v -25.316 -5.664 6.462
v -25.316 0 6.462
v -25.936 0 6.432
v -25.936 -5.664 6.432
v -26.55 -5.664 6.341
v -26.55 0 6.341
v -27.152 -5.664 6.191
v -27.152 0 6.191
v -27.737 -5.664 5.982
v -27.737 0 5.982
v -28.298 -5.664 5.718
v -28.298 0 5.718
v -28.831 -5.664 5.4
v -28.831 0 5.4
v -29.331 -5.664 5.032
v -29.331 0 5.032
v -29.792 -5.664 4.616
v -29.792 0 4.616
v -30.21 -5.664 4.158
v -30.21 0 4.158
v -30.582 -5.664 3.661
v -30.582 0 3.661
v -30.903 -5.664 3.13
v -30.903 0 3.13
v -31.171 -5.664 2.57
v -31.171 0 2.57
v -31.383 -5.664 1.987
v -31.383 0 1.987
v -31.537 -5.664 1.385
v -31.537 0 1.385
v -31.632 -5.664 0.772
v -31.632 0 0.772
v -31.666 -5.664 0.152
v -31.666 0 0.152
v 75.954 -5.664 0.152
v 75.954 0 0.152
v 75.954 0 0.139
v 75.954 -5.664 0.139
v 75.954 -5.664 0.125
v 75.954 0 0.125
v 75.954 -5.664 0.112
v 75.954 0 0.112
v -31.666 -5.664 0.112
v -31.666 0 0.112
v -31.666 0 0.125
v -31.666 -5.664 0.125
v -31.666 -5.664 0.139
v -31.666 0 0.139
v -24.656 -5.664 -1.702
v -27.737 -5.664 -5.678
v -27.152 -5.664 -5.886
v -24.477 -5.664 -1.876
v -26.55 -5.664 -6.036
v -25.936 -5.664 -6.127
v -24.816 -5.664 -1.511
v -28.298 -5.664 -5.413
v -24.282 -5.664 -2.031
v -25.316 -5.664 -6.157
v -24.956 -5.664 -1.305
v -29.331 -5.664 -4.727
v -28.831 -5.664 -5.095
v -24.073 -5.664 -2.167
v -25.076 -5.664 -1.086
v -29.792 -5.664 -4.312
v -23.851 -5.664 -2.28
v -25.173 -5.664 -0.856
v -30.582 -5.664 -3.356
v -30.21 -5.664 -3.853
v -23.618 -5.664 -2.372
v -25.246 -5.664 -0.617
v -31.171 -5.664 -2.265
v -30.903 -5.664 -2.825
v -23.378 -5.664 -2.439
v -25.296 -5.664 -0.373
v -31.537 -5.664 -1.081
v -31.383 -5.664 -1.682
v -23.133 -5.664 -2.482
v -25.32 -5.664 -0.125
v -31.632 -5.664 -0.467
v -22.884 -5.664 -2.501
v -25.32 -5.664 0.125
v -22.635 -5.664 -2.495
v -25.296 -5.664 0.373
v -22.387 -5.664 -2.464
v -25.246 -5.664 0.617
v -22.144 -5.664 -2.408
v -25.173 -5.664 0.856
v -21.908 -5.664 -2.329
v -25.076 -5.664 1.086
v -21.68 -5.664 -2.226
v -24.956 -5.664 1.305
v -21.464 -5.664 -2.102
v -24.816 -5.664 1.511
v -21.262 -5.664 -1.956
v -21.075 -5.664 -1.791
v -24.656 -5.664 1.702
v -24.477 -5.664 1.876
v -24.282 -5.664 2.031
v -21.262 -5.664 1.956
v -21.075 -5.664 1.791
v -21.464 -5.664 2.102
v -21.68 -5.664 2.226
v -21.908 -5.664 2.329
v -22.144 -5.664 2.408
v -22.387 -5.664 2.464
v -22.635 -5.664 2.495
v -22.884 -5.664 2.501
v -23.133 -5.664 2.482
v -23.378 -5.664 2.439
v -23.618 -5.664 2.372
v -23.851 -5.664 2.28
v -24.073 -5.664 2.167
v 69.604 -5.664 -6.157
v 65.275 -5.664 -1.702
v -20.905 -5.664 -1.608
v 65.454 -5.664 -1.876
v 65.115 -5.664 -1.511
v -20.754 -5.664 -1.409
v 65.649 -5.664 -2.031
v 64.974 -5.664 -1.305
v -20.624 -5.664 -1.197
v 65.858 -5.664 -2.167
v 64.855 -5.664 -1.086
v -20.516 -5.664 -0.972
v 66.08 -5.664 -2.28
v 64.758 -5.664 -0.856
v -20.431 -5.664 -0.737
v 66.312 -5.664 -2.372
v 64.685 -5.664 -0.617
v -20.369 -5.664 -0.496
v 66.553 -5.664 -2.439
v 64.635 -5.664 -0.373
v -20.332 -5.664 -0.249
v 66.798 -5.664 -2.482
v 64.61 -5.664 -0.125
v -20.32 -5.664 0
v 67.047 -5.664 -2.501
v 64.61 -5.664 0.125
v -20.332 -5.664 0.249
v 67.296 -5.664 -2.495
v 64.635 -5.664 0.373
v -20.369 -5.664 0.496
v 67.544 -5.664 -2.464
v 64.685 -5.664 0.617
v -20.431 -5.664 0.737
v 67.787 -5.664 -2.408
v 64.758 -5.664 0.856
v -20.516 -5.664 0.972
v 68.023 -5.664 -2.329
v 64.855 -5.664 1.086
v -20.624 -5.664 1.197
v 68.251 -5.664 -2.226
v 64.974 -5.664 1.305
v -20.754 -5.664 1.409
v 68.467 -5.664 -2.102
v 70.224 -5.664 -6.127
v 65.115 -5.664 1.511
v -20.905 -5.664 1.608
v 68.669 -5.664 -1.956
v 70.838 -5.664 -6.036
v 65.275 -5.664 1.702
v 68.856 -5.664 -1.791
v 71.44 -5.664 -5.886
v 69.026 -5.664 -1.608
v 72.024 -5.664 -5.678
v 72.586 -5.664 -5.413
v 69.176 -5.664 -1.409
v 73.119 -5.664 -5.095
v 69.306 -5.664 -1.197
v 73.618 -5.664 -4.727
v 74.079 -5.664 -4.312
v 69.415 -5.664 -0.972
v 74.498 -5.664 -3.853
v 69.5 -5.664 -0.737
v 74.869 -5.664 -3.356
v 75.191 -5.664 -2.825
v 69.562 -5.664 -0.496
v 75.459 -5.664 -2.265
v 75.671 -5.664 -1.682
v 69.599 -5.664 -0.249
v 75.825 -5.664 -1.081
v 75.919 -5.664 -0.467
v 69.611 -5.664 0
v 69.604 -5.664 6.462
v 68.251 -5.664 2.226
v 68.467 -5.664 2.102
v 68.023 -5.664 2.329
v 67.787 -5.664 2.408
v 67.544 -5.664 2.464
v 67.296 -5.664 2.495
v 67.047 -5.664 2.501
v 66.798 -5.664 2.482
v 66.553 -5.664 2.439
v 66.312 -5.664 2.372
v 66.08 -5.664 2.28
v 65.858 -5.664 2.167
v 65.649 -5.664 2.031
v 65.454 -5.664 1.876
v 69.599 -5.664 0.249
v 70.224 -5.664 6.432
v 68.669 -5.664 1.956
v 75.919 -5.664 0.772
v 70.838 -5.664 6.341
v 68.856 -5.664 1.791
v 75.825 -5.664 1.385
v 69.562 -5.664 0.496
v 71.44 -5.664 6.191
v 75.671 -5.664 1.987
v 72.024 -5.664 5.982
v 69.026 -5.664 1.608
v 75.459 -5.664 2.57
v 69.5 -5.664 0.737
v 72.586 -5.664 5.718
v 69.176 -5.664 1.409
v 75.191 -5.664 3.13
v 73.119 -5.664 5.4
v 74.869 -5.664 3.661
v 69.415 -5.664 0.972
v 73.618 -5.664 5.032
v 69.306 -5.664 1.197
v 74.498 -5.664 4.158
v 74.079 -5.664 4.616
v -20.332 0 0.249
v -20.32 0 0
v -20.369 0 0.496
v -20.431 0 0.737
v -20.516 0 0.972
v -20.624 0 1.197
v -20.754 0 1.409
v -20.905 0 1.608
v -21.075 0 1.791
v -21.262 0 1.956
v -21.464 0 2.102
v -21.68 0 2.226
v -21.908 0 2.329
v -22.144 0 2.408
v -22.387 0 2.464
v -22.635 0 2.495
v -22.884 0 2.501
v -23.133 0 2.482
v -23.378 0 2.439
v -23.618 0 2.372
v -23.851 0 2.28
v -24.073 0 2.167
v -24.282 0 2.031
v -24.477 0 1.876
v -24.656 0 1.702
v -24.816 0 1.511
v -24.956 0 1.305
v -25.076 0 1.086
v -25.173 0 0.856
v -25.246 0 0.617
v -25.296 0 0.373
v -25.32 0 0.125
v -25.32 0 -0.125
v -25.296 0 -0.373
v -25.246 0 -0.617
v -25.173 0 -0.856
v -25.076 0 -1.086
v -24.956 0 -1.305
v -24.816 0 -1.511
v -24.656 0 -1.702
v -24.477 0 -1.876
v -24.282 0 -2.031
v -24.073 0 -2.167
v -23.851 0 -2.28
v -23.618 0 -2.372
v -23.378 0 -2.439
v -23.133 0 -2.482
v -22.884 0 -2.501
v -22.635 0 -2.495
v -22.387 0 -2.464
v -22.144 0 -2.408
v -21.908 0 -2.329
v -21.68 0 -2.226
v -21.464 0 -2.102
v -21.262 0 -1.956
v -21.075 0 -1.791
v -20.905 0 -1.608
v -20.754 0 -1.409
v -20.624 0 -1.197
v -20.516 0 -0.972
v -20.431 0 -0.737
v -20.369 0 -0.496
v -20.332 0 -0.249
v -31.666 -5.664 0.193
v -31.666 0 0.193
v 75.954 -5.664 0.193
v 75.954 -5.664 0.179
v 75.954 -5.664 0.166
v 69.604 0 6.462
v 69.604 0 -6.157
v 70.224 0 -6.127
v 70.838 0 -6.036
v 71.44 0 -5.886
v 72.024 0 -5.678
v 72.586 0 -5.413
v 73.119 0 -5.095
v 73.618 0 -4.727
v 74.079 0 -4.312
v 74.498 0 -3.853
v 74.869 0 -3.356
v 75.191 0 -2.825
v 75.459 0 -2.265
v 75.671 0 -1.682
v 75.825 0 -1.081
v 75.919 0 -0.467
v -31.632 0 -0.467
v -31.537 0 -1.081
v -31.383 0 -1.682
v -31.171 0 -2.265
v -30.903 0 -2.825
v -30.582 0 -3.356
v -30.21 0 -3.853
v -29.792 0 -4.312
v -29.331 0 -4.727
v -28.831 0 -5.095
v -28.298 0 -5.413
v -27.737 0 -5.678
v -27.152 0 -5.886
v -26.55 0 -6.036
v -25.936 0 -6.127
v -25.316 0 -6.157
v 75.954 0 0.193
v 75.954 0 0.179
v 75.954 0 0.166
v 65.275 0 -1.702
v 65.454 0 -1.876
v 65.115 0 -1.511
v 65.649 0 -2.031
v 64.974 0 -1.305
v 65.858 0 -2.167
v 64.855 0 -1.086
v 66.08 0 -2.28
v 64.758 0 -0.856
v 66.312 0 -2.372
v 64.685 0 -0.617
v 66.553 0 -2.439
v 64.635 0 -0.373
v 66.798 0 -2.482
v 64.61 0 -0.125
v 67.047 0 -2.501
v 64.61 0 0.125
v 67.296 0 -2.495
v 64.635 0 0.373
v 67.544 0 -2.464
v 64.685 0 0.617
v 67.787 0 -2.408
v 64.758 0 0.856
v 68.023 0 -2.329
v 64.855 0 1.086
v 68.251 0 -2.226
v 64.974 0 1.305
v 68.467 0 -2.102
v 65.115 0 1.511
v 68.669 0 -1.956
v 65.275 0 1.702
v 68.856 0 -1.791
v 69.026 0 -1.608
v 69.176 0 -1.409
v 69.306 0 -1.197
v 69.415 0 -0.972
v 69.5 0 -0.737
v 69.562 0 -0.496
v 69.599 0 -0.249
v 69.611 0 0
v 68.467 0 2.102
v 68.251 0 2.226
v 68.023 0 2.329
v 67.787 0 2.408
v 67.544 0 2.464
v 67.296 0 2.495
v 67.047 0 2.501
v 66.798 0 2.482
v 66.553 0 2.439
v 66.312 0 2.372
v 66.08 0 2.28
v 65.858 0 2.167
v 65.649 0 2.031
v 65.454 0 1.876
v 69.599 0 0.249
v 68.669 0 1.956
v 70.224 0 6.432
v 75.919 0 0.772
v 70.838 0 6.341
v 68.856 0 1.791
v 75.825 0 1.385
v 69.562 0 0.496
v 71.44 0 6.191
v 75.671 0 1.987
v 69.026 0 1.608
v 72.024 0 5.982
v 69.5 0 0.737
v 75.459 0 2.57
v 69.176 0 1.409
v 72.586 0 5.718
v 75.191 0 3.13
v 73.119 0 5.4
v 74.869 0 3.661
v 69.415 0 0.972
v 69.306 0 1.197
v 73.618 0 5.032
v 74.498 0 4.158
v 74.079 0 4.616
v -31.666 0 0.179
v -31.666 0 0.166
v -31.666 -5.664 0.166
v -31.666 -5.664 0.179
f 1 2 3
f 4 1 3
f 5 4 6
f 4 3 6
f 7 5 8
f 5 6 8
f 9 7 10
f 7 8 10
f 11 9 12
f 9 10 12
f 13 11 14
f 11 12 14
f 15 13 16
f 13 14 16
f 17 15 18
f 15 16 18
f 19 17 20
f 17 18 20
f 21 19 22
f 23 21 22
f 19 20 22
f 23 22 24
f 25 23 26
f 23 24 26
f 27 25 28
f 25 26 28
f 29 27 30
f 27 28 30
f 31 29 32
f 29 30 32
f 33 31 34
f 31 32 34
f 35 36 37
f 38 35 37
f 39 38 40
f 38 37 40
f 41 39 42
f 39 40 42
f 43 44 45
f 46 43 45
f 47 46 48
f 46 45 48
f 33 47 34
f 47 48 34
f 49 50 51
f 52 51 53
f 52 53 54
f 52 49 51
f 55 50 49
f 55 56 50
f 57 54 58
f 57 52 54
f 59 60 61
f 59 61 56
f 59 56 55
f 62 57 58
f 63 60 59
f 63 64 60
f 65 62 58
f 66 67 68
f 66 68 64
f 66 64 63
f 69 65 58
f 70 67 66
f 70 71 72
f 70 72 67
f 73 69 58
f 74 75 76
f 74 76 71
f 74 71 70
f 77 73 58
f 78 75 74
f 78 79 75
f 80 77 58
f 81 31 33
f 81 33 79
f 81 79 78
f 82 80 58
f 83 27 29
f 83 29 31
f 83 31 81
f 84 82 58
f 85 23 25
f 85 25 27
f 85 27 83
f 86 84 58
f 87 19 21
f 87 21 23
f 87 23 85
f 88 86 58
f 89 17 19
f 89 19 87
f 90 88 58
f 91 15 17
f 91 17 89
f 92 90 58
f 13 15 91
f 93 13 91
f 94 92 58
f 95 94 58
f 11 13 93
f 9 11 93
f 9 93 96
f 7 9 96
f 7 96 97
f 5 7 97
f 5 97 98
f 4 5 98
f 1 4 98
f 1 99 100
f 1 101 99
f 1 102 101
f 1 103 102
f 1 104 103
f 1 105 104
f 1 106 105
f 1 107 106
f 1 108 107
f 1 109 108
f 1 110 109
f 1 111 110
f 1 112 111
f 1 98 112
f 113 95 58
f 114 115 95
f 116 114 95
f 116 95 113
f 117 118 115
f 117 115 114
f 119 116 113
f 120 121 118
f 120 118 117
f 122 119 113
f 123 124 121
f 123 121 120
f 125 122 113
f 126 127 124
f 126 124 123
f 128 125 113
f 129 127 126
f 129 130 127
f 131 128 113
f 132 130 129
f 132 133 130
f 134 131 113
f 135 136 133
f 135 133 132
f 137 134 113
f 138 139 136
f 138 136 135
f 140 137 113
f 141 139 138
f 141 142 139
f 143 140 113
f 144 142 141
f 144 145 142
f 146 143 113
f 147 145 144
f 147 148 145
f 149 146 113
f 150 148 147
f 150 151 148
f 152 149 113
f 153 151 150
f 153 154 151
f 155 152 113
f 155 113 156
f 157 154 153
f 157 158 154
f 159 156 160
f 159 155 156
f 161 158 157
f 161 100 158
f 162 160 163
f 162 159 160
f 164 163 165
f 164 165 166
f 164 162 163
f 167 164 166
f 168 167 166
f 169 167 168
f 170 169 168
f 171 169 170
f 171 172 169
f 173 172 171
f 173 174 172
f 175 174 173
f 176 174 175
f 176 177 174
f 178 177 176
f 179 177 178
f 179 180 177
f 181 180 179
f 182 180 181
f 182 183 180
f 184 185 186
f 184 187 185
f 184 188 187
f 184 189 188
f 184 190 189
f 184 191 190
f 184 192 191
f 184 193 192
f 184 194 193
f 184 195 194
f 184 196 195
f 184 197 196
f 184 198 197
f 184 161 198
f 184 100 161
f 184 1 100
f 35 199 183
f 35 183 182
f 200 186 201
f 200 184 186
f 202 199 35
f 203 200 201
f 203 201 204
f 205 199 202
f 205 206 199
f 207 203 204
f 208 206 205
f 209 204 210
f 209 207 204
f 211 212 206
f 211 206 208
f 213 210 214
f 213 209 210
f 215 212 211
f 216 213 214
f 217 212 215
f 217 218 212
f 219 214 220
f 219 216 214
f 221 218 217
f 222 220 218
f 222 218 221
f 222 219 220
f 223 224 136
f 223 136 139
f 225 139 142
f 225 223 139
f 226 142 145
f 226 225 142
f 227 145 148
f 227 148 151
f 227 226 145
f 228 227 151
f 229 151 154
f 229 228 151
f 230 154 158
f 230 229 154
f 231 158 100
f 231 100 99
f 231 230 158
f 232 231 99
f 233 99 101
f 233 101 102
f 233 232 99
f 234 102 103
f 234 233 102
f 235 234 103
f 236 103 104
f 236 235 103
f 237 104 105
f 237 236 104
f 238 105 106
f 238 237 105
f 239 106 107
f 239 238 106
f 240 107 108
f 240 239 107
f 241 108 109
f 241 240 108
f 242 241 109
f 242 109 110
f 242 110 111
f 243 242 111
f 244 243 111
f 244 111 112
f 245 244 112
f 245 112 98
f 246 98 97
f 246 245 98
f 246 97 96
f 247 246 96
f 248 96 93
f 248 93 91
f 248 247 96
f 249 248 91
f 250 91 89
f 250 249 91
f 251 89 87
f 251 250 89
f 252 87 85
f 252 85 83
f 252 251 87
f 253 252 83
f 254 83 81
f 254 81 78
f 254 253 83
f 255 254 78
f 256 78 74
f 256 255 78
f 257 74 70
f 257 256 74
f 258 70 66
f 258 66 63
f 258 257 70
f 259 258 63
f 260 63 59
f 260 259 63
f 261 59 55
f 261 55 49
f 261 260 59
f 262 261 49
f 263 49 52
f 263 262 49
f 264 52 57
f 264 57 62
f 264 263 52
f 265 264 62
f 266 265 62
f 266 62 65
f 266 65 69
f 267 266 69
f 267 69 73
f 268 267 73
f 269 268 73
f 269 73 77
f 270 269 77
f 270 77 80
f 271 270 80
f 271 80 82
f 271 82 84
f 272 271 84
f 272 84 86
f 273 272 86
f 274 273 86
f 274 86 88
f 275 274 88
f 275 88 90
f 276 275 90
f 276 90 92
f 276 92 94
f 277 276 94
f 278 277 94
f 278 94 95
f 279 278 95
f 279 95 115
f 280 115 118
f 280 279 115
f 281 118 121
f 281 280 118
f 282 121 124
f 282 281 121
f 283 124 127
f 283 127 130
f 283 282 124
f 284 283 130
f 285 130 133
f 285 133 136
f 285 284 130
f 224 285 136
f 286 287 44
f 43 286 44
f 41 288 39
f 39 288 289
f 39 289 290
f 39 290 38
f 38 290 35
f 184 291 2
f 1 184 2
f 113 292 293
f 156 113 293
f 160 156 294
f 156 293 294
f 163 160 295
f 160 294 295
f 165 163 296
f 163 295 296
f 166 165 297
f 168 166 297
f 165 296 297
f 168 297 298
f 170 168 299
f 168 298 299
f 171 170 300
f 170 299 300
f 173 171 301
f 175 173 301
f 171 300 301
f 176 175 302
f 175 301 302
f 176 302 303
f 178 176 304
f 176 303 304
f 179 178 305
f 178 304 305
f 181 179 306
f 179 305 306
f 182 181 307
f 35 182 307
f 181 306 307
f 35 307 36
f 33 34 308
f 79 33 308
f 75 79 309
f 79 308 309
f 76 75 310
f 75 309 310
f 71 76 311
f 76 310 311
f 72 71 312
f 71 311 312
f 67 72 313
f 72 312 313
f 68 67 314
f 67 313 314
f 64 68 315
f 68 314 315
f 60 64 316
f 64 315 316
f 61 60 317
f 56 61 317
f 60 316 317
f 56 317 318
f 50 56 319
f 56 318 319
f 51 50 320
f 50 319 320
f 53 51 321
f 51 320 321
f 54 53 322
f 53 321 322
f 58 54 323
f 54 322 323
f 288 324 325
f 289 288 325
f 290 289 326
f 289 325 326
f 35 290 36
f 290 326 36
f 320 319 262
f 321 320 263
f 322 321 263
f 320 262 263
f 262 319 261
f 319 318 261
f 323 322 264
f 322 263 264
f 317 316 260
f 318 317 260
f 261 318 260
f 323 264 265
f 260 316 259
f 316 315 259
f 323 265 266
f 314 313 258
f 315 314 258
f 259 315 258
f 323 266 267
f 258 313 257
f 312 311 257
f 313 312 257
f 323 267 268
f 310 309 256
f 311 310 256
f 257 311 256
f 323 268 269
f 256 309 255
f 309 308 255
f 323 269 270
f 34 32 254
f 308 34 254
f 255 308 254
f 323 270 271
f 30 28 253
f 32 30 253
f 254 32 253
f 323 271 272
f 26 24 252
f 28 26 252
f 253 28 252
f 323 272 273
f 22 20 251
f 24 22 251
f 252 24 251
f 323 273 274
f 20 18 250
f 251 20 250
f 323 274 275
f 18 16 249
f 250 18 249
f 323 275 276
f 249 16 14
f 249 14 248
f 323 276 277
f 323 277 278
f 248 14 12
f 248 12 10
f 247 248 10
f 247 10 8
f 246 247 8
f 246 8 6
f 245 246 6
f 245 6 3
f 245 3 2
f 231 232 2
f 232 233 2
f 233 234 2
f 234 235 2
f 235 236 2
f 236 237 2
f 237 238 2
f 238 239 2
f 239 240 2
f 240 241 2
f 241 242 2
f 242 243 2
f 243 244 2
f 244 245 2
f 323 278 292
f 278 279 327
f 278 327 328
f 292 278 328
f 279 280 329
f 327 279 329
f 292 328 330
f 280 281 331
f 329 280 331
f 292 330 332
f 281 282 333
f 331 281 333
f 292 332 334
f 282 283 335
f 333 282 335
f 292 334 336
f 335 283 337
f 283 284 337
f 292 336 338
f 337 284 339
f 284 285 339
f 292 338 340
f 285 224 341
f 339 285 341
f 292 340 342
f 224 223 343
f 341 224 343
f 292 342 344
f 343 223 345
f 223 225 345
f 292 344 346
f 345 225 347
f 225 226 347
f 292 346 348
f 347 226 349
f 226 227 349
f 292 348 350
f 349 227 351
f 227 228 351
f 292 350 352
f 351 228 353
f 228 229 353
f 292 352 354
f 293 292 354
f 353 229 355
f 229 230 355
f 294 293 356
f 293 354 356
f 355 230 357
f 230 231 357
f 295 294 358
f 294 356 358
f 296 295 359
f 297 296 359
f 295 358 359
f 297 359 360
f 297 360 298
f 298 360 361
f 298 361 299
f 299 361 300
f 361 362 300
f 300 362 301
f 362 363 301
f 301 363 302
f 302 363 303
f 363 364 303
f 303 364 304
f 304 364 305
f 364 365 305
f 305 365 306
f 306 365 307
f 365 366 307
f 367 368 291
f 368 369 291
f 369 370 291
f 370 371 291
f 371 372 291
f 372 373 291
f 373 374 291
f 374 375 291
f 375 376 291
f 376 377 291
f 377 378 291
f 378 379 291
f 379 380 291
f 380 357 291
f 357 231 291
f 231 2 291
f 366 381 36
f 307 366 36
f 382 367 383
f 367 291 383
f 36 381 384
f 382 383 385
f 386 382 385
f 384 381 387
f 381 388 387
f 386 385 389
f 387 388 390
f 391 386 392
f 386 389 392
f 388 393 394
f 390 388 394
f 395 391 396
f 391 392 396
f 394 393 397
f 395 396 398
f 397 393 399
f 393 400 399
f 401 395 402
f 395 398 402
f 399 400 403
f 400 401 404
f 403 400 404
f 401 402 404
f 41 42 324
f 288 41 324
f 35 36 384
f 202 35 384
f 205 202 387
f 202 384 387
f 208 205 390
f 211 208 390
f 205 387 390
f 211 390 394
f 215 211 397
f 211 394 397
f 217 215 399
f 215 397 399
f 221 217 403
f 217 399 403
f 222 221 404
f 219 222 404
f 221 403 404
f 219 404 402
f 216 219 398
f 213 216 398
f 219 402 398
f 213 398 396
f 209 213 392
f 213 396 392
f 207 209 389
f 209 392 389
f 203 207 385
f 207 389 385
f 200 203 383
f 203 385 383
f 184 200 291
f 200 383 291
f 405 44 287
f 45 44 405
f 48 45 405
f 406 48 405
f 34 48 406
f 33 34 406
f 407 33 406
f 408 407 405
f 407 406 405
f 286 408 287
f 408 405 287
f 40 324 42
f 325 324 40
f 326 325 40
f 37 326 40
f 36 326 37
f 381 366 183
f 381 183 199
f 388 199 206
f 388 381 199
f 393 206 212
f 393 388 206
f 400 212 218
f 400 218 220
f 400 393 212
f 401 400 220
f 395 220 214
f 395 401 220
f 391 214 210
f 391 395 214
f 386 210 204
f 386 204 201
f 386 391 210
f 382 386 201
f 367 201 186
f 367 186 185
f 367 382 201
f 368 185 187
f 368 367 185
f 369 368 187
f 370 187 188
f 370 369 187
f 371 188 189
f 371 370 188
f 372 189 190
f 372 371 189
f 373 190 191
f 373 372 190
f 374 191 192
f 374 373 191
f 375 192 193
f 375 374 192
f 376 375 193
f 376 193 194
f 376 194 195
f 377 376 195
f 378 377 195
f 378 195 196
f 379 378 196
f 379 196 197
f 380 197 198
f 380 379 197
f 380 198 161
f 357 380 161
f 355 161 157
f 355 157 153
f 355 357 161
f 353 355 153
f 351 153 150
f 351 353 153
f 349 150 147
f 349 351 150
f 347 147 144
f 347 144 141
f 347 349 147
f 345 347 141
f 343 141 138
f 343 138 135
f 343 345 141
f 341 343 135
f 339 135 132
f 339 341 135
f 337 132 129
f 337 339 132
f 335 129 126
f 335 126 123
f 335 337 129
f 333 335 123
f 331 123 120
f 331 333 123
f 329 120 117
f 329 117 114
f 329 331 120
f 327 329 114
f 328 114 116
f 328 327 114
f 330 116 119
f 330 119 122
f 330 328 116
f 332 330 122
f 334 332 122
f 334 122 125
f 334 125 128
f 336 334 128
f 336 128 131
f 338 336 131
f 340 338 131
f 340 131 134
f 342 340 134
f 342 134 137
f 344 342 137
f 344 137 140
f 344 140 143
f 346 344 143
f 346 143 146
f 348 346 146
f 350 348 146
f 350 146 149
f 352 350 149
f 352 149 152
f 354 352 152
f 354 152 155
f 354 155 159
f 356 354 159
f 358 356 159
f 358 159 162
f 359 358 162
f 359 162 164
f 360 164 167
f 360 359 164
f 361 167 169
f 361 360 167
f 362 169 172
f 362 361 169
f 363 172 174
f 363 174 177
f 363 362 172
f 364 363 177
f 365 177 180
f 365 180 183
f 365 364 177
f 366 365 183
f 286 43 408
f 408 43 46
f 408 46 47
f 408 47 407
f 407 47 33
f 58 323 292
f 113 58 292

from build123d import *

# Parameters (mm, degrees)
F1_DEPTH = 5.6642
F0_R     = 2.5019


with BuildPart() as f1:
    # F0 (on Front) → F1 (new body)
    with BuildSketch(Plane.XZ):
        with BuildLine():
            ThreePointArc((75.9537016329, 0.1928798135), (75.9536693652, 0.1726363284), (75.9535725625, 0.152393049))
            ThreePointArc((75.9535725625, 0.152393049), (75.9536693652, 0.1321497696), (75.9537016329, 0.1119062845))
            Line((75.9537016329, 0.1119062845), (75.9537016329, 0.1928798135))
        make_face()
    extrude(amount=F1_DEPTH)


with BuildPart() as f1b:
    # F0 (on Front) → F1, piece 2 (new body)
    with BuildSketch(Plane.XZ):
        with BuildLine():
            ThreePointArc((-31.6660983671, 0.1119062845), (-31.6660660994, 0.1321497696), (-31.6659692966, 0.152393049))
            ThreePointArc((-31.6659692966, 0.152393049), (-31.6660660994, 0.1726363284), (-31.6660983671, 0.1928798135))
            Line((-31.6660983671, 0.1928798135), (-31.6660983671, 0.1119062845))
        make_face()
    extrude(amount=F1_DEPTH)


with BuildPart() as f1c:
    # F0 (on Front) → F1, piece 3 (new body)
    with BuildSketch(Plane.XZ):
        with BuildLine():
            Line((69.6037016329, 6.4619062845), (-25.3160983671, 6.4619062845))
            ThreePointArc((-25.3160983671, 6.4619062845), (-29.7918893053, 4.6163258339), (-31.6659692966, 0.152393049))
            ThreePointArc((-31.6659692966, 0.152393049), (-29.7918893053, -4.3115397359), (-25.3160983671, -6.1571201865))
            Line((-25.3160983671, -6.1571201865), (69.6037016329, -6.1571201865))
            ThreePointArc((69.6037016329, -6.1571201865), (74.0794925711, -4.3115397359), (75.9535725625, 0.152393049))
            ThreePointArc((75.9535725625, 0.152393049), (74.0794925711, 4.6163258339), (69.6037016329, 6.4619062845))
        make_face()
        with Locations((-22.8216443211, 0)):
            Circle(F0_R, mode=Mode.SUBTRACT)
        with Locations((67.1092475869, 0)):
            Circle(F0_R, mode=Mode.SUBTRACT)
    extrude(amount=F1_DEPTH)


solid = Compound([f1.part, f1b.part, f1c.part])
